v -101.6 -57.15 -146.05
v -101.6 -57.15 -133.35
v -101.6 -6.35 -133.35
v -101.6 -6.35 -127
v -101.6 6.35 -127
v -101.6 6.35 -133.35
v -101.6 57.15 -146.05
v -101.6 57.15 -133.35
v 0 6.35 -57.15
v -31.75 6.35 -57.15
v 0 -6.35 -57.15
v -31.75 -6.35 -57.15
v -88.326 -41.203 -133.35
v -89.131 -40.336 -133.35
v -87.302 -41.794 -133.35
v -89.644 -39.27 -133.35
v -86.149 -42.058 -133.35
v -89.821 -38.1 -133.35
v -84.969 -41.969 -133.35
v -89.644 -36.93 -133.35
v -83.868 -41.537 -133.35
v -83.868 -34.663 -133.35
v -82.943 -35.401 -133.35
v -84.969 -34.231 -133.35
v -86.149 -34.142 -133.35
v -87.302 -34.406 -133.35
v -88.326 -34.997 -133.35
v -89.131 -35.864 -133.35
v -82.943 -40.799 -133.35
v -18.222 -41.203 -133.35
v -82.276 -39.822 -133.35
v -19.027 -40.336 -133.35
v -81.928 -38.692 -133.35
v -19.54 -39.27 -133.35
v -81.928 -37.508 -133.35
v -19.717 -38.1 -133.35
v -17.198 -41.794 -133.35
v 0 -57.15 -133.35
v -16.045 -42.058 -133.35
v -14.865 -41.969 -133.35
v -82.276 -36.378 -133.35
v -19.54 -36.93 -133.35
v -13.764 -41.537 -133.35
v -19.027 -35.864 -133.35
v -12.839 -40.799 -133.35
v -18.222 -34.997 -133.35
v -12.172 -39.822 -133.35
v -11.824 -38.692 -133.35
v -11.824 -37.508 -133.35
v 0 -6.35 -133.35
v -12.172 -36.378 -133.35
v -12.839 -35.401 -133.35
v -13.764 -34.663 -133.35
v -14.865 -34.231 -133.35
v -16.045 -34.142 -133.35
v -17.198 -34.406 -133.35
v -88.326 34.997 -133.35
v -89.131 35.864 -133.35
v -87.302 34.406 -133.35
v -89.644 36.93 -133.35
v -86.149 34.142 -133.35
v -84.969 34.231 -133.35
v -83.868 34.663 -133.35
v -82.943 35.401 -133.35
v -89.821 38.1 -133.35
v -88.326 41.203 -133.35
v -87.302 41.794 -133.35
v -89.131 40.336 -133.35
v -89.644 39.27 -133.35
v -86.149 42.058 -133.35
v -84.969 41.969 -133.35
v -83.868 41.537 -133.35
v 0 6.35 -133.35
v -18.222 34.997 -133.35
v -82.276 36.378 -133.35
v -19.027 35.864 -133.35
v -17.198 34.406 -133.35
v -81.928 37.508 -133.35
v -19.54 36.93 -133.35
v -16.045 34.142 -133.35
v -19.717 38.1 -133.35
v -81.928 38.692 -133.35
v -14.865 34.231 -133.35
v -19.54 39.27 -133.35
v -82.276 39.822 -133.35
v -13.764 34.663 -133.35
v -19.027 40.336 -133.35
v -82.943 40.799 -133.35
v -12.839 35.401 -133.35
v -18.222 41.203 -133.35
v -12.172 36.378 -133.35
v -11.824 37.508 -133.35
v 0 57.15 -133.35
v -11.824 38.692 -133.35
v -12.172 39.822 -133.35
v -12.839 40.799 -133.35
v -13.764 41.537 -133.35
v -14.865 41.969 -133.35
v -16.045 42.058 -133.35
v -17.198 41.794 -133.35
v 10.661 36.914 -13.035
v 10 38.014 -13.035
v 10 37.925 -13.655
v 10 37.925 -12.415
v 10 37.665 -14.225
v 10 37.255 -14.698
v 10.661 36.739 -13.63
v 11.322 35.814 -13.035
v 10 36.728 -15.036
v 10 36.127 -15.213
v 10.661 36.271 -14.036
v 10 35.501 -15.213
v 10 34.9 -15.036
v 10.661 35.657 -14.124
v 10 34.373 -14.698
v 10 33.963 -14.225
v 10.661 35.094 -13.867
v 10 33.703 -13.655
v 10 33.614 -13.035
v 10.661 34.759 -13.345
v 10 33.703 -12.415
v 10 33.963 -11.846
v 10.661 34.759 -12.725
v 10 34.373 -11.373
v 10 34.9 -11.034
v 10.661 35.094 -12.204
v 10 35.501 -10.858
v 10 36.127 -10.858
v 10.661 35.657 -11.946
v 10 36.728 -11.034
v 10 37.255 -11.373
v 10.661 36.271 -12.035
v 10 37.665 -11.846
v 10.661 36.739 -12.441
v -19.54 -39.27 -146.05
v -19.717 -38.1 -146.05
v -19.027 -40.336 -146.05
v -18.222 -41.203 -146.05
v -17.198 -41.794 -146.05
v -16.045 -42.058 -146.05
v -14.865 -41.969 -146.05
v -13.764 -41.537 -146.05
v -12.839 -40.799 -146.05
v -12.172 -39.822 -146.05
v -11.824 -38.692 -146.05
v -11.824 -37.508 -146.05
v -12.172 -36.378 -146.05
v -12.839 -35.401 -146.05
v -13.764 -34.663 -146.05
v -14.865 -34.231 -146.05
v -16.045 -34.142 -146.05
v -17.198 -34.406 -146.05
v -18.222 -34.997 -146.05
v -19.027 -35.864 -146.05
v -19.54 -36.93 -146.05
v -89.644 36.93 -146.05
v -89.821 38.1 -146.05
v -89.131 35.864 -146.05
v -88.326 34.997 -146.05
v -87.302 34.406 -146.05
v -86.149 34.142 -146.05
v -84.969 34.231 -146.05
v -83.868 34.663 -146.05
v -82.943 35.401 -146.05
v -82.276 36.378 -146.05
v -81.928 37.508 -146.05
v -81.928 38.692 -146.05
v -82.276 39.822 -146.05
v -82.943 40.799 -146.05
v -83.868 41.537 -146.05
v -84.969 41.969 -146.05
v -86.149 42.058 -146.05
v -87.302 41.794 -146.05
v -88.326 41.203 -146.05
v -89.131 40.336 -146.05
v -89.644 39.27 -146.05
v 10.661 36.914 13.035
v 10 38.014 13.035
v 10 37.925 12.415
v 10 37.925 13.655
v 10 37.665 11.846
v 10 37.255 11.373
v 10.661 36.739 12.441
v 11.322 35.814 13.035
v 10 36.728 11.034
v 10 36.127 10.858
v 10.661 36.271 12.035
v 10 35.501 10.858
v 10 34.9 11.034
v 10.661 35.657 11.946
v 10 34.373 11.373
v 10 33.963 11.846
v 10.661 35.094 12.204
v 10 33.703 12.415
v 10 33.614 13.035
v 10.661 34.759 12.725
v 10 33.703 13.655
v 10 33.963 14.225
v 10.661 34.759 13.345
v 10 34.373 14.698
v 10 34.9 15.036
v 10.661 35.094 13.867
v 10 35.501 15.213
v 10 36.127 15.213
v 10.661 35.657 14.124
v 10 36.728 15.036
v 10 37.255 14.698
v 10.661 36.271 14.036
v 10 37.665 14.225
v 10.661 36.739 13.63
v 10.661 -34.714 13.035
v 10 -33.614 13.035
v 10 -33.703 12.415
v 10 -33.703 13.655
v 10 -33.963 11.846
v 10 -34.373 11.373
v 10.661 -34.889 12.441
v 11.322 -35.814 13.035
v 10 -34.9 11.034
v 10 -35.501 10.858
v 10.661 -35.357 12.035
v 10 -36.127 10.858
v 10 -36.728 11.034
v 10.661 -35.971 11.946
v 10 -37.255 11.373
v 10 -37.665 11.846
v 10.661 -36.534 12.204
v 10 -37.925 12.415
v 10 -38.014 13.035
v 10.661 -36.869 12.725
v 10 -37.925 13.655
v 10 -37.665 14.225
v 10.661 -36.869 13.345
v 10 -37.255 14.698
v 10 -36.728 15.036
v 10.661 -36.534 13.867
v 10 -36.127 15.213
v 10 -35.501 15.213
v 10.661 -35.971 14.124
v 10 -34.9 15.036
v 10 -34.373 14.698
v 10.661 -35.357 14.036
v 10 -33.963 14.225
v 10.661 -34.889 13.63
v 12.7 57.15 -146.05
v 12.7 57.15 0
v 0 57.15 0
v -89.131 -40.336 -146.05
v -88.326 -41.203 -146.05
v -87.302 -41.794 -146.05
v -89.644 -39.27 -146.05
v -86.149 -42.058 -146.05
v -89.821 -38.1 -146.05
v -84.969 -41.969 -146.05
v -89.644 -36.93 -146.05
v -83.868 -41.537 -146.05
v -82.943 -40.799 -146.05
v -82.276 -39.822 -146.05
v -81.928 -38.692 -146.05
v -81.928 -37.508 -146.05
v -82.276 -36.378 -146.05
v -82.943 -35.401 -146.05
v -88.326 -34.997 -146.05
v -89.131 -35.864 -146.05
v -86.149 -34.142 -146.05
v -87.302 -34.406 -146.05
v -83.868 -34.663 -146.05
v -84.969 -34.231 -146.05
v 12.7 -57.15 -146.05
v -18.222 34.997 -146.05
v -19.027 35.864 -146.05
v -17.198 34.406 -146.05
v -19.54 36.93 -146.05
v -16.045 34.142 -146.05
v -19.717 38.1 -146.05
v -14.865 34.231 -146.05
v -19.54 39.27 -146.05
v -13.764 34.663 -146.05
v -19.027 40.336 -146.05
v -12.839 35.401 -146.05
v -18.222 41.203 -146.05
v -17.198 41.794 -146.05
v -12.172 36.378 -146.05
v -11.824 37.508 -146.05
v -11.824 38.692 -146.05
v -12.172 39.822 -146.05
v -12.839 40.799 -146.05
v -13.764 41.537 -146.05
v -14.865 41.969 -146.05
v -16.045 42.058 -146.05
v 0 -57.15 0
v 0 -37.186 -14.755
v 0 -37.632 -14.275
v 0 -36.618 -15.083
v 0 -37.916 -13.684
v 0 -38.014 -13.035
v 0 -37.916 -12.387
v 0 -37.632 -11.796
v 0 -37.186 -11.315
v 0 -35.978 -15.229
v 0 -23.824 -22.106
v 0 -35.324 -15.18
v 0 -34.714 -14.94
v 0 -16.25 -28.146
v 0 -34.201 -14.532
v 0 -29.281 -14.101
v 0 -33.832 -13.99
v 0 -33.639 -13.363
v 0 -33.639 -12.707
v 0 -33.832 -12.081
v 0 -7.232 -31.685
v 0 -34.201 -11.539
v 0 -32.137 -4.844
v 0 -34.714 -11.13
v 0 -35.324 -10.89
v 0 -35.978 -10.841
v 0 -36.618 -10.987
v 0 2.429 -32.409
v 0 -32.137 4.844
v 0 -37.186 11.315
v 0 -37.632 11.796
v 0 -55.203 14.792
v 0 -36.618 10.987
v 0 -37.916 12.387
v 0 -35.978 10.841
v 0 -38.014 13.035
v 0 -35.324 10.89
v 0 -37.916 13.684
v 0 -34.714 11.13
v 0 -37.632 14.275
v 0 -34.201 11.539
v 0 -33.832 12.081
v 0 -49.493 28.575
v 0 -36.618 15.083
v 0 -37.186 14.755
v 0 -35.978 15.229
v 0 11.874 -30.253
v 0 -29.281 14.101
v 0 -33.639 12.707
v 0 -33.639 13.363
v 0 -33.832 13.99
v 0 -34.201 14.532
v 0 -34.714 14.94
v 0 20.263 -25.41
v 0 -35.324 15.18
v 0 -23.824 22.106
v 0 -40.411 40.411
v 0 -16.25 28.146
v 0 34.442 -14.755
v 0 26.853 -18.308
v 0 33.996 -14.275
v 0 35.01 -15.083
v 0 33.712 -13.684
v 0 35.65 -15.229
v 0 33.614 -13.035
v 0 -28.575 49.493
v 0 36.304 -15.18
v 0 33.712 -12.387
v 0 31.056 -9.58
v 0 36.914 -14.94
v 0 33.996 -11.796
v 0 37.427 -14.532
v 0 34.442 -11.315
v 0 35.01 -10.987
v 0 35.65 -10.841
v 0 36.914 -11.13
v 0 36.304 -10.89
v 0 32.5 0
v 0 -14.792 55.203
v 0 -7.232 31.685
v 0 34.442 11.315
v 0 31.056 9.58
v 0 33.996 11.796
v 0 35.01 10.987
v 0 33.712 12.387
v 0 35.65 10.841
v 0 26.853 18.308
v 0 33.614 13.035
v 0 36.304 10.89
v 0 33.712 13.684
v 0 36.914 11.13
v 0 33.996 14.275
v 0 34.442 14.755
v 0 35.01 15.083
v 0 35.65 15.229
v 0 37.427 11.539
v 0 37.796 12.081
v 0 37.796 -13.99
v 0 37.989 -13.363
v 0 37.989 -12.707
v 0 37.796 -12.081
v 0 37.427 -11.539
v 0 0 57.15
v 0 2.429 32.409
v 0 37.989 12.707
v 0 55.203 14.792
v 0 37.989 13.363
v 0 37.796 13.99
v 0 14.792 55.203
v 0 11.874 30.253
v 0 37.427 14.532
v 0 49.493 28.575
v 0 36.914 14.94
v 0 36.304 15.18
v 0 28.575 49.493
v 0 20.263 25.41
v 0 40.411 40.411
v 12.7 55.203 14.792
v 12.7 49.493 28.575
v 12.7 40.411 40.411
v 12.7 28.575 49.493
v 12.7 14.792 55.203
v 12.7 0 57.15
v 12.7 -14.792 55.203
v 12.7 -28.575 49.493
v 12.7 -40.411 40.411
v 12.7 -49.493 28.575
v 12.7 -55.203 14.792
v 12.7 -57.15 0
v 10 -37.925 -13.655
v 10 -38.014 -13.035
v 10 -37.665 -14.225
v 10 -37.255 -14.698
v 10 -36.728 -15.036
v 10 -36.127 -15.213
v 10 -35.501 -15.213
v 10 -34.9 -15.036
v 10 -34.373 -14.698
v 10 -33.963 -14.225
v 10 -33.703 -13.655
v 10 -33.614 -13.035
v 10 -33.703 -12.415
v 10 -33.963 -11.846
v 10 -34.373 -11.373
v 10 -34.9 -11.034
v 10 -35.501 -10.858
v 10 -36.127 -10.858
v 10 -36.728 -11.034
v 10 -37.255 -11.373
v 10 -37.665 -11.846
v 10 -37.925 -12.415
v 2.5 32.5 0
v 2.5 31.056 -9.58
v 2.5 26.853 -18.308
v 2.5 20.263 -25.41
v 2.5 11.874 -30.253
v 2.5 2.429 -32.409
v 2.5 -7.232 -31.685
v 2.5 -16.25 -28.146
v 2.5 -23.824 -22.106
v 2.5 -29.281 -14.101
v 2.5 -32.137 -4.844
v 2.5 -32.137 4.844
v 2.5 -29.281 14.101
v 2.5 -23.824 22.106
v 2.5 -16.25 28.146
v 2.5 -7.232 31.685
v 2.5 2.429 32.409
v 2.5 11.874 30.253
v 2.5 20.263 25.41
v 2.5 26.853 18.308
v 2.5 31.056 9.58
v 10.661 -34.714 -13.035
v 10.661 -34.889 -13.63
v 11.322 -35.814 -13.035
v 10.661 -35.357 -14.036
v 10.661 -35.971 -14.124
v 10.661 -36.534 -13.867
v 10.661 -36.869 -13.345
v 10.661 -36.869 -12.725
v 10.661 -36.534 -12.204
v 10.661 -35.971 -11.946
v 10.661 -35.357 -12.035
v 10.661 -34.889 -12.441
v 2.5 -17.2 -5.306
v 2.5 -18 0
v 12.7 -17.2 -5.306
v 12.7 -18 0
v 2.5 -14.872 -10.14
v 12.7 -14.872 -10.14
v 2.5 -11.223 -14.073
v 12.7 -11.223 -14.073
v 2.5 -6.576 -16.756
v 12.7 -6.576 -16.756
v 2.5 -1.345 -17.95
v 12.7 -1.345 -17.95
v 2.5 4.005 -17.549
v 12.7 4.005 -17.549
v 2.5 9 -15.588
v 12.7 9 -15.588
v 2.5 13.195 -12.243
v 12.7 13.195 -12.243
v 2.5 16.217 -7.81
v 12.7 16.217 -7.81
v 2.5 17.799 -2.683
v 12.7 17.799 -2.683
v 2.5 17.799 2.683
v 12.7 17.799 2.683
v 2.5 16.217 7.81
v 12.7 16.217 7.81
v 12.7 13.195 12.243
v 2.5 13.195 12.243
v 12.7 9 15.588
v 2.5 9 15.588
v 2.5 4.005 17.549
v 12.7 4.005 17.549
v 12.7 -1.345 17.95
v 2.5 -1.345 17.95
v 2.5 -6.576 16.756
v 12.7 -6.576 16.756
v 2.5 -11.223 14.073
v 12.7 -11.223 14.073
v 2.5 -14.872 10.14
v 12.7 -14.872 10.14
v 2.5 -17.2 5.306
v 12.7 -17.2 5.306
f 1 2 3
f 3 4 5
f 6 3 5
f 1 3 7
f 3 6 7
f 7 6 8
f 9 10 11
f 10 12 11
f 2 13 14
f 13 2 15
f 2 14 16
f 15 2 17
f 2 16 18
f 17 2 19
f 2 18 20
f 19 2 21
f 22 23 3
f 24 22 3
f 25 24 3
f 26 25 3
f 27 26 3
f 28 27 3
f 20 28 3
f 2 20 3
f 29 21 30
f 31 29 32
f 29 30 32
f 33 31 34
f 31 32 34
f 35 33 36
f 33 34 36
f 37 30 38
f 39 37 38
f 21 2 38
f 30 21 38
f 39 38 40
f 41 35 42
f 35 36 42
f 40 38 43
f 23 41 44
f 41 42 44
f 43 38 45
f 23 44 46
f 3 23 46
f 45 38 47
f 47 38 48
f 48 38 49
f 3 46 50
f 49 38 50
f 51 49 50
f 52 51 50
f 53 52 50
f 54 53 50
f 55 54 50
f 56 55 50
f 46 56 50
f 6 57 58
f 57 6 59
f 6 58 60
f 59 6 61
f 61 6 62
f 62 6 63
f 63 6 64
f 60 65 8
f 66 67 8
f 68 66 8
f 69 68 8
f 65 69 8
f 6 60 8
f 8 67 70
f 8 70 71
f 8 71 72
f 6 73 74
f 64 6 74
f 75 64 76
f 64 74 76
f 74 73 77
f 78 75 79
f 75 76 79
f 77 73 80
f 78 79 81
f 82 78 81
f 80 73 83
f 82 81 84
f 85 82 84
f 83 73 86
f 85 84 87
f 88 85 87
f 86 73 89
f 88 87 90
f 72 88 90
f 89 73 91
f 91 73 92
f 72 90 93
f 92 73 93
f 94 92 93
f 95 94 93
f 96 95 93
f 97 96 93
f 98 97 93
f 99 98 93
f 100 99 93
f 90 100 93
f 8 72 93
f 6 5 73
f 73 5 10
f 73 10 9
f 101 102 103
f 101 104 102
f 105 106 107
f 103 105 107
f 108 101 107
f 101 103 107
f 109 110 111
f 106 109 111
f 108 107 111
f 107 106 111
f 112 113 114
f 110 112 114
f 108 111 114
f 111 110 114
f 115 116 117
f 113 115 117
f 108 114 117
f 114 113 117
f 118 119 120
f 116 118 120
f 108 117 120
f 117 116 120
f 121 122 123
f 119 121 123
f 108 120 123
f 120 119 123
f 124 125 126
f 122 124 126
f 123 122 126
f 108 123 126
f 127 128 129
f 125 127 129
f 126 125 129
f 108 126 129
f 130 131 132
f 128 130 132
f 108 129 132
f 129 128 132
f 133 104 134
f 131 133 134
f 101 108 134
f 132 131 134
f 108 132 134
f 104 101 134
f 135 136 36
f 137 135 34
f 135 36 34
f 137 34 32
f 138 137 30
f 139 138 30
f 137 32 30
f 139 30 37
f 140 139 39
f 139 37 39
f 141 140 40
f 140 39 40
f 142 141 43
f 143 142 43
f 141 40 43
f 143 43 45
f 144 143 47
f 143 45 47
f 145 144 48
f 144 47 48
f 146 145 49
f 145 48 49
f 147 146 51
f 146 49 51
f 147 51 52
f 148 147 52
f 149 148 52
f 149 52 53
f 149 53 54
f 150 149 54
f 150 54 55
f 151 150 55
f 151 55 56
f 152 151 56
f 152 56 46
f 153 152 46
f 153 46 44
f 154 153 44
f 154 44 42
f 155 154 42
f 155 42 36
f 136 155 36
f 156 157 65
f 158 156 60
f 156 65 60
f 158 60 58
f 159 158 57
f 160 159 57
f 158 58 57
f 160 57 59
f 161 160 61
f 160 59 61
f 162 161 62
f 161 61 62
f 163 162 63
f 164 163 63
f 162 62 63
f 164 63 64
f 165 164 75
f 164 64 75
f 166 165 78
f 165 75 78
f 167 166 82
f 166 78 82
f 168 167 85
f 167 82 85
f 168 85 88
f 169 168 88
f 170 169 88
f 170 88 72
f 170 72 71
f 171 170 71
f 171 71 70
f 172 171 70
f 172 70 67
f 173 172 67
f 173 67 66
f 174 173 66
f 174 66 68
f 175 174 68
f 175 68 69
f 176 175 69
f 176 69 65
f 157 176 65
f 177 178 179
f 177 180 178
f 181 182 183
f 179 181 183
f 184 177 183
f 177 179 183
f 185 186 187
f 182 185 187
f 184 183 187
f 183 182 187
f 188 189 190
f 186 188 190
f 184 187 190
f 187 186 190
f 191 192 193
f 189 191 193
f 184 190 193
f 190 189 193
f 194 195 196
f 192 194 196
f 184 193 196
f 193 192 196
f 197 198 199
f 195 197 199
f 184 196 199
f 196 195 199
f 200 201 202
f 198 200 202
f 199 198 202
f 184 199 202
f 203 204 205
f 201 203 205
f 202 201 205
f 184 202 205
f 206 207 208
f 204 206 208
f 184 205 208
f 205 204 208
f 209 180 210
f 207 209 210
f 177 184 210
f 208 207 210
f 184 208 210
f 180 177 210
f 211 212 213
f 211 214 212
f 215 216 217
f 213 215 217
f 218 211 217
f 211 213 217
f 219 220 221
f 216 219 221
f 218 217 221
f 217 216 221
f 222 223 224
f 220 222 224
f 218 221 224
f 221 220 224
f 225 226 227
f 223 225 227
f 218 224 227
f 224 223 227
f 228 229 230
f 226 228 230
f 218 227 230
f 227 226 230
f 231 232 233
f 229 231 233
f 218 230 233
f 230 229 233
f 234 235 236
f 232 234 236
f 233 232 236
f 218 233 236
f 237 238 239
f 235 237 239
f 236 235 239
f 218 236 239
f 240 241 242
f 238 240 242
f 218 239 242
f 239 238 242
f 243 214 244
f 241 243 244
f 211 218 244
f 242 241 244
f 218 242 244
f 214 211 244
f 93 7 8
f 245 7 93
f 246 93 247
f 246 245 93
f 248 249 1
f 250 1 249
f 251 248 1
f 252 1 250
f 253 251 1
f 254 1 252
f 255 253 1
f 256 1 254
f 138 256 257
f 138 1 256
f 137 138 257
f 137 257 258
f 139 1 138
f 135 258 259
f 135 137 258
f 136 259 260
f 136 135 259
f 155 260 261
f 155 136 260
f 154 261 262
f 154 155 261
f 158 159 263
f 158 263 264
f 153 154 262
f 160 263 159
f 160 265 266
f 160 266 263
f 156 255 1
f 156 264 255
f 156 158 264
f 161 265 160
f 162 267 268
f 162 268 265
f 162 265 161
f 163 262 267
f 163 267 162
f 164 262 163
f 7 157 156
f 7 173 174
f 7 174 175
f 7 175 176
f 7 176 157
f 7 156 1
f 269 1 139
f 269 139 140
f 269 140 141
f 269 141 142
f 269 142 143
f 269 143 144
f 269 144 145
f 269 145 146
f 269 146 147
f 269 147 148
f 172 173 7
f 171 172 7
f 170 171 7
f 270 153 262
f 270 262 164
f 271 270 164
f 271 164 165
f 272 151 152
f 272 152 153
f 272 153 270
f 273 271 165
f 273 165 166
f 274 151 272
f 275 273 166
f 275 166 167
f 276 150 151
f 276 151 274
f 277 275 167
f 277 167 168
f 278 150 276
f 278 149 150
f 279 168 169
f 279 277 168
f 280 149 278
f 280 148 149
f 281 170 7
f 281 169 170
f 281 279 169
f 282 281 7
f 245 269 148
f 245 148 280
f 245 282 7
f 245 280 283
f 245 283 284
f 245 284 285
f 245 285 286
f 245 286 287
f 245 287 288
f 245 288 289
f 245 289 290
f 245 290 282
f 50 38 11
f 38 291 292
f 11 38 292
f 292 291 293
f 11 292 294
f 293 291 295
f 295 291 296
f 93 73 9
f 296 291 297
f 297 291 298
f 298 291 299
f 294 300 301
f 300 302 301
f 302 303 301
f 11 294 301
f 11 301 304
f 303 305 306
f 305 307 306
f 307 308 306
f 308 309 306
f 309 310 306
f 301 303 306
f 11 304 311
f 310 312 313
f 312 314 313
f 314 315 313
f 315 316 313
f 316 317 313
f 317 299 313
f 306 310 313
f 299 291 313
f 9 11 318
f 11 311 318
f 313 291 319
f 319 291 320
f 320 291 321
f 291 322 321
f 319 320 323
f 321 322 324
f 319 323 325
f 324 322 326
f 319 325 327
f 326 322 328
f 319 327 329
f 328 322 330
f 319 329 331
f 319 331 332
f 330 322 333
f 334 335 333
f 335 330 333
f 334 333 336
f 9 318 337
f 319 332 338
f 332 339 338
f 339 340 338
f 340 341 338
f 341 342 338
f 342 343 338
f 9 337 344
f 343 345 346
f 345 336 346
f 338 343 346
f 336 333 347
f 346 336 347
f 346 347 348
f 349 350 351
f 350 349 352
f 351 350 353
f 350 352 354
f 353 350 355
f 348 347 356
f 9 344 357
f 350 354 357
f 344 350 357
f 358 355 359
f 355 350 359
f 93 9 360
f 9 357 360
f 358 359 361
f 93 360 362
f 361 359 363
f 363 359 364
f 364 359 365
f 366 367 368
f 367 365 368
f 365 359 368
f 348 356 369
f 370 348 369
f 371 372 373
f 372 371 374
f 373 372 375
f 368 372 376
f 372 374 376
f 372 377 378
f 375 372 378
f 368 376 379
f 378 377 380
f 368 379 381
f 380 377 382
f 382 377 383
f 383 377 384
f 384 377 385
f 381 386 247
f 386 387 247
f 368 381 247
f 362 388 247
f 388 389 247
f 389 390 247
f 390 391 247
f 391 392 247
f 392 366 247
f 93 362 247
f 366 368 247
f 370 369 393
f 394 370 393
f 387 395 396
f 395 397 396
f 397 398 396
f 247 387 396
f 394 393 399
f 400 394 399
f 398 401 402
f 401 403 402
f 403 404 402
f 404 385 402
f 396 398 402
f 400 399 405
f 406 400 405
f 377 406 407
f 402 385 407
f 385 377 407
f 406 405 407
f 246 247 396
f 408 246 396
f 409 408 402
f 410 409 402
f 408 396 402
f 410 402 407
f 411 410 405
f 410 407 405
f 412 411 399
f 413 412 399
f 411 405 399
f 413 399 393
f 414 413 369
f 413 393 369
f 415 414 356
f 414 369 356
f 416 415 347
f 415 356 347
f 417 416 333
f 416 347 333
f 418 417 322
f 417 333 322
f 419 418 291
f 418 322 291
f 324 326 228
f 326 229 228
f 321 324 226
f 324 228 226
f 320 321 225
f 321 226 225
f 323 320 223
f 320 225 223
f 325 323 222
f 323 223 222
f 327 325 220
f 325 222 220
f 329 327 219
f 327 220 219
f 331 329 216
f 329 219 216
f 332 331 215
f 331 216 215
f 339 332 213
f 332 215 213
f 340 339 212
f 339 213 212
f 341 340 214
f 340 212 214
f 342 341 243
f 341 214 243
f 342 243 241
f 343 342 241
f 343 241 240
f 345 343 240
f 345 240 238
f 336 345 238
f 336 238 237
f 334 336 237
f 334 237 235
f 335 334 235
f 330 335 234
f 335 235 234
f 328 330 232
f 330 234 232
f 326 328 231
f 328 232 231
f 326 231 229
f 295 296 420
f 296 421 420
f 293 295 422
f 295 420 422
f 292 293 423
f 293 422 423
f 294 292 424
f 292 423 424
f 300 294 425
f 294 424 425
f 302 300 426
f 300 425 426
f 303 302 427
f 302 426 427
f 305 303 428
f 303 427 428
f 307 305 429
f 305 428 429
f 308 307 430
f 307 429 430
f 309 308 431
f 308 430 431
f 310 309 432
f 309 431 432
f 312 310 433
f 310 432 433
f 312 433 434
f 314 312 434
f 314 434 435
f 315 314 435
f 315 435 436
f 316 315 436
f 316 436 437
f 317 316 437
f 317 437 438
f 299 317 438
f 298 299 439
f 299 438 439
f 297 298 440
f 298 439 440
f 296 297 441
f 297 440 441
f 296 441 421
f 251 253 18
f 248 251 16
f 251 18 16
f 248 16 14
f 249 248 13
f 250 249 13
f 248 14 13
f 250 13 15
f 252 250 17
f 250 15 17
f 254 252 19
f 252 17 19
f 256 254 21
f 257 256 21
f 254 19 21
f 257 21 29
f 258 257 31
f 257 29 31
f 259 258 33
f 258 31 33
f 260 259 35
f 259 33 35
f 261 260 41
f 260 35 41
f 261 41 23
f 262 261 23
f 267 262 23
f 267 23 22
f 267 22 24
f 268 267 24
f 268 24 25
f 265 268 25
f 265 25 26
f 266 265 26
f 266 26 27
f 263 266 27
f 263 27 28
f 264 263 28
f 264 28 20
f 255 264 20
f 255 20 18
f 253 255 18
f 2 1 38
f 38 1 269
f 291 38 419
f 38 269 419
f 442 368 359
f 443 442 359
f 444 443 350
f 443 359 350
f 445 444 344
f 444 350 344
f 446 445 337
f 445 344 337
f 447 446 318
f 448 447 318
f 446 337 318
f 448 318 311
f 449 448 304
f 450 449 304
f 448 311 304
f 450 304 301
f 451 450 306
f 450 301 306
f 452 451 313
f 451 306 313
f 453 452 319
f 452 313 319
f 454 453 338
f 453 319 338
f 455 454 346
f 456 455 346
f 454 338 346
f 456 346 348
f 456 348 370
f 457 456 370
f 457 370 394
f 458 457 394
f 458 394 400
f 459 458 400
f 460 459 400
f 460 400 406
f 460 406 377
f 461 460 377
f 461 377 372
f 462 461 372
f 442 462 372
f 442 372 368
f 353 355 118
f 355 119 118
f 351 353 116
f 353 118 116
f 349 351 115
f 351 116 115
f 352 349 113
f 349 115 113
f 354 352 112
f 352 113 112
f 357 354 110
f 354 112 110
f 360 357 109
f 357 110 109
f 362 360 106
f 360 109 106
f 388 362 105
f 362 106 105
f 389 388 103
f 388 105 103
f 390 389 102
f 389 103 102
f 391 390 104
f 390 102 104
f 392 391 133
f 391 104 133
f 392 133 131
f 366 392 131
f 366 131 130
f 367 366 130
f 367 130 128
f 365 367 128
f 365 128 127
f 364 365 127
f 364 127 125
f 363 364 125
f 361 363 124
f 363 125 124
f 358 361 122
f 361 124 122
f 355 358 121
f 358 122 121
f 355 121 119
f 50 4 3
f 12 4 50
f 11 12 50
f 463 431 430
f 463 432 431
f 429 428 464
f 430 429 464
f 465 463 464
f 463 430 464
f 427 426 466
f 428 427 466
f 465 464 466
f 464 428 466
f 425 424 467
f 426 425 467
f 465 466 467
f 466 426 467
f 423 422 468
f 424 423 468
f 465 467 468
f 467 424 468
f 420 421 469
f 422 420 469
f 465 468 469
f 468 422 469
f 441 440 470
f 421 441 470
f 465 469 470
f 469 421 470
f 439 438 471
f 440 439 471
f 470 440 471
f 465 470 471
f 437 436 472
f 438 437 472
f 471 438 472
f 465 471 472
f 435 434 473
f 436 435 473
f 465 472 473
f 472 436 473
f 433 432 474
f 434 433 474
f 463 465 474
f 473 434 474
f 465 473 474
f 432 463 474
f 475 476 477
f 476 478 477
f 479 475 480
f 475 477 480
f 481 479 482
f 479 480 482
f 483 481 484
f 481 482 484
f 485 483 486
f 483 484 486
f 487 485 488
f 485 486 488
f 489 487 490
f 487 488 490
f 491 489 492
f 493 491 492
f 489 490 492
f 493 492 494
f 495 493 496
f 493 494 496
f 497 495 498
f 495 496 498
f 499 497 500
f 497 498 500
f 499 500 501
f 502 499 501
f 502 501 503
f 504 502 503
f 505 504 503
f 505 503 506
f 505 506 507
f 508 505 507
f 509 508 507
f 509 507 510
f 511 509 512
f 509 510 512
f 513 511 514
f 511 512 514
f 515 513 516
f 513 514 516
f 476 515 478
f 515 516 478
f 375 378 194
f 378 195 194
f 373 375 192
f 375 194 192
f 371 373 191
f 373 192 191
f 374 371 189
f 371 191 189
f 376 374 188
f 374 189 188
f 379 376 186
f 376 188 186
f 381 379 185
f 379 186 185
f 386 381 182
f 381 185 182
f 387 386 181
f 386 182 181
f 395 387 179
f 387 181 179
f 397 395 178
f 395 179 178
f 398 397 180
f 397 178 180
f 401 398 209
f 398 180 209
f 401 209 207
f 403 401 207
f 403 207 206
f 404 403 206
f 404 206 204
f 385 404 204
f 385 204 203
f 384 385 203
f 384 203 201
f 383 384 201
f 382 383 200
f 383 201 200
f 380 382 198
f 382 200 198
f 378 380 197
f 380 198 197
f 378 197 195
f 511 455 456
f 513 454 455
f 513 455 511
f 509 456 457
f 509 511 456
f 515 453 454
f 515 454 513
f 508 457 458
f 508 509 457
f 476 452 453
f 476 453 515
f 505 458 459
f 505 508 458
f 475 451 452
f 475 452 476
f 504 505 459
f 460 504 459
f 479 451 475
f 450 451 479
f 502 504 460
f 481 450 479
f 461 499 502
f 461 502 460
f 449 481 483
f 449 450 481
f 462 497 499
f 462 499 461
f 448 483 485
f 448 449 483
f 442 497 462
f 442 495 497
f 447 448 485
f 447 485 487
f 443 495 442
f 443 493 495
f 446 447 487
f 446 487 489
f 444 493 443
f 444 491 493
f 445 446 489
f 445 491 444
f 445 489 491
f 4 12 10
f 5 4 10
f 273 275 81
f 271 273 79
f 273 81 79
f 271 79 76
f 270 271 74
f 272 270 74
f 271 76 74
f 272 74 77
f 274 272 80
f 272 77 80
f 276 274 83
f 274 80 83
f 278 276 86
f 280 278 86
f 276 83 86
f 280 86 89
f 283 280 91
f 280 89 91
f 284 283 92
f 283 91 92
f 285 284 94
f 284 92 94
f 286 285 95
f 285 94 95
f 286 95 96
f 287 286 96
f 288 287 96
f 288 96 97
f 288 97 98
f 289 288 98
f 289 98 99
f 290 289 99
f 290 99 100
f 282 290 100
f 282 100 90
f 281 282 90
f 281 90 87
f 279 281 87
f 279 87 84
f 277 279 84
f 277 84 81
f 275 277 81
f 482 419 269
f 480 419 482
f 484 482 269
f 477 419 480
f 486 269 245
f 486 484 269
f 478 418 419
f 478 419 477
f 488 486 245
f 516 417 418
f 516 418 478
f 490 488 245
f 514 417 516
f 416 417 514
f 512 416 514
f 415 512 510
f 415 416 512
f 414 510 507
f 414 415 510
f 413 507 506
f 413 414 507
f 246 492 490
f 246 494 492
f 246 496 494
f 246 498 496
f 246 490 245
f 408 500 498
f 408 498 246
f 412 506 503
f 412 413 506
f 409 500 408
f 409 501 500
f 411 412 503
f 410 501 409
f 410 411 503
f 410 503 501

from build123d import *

# Parameters (mm, degrees)
F1_DEPTH       = 12.7
F2_D           = 36
F2_DEPTH       = 36
F2_CBORE_D     = 65
F2_CBORE_DEPTH = 2.5
F2_TIP         = 10.8154911425
F4_D           = 4.4
F4_DEPTH       = 10
F4_TIP         = 1.3218933619
F5_W           = 114.3
F5_H           = 12.7
F6_DEPTH       = 101.6
F7_W           = 101.6
F7_H           = 76.2
F8_DEPTH       = 6.35
F9_SIZE        = 69.85
F11_D          = 7.9375


# Not quite as in the source:
# - a length typed as a fraction of an inch, garbled in the dataset ("3 / 203.2 mm" for 3/8 in), is restored


with BuildPart() as f1:
    # F0 (on Right) → F1 (new body)
    with BuildSketch(Plane.YZ):
        with BuildLine():
            Line((57.15, -146.05), (57.15, 0))
            ThreePointArc((57.15, 0), (0, 57.15), (-57.15, 0))
            Line((-57.15, 0), (-57.15, -146.05))
            Line((-57.15, -146.05), (57.15, -146.05))
        make_face()
    extrude(amount=F1_DEPTH)

    # F2
    with Locations(Plane(origin=(0, 0, 0), x_dir=(0, 1, 0), z_dir=(-1, 0, 0))):
        with Locations((0, 0)):
            CounterBoreHole(F2_D / 2, F2_CBORE_D / 2, F2_CBORE_DEPTH, depth=F2_DEPTH)
            with Locations((0, 0, -(F2_DEPTH + F2_TIP / 2))):  # 118° drill point
                Cone(0, F2_D / 2, F2_TIP, mode=Mode.SUBTRACT)

    # F4
    with Locations(Plane(origin=(0, 0, 0), x_dir=(0, 1, 0), z_dir=(-1, 0, 0))):
        with Locations((35.814, -13.03522997), (35.814, 13.03522997), (-35.814, -13.03522997), (-35.814, 13.03522997)):
            Hole(F4_D / 2, depth=F4_DEPTH)
            with Locations((0, 0, -(F4_DEPTH + F4_TIP / 2))):  # 118° drill point
                Cone(0, F4_D / 2, F4_TIP, mode=Mode.SUBTRACT)

    # F5 (on face) → F6 (join)
    with BuildSketch(Plane.YZ):
        with Locations((0, -139.7)):
            Rectangle(F5_W, F5_H)
    extrude(amount=-F6_DEPTH)

    # F7 (on Front) → F8 (join, symmetric)
    with BuildSketch(Plane.XZ):
        with Locations((-50.8, -95.25)):
            Rectangle(F7_W, F7_H)
    extrude(amount=F8_DEPTH, both=True)

    # F9
    f9_edges = [f1.edges().sort_by_distance(p)[0] for p in [
        (-101.6, 0, -57.15),
    ]]
    chamfer(f9_edges, length=F9_SIZE)

    # F11 (through all)
    with Locations(Plane(origin=(0, 0, -146.05), x_dir=(1, 0, 0), z_dir=(0, 0, -1))):
        with Locations((-85.852, 38.1), (-15.748, 38.1), (-85.852, -38.1), (-15.748, -38.1)):
            Hole(F11_D / 2)


solid = f1.part
